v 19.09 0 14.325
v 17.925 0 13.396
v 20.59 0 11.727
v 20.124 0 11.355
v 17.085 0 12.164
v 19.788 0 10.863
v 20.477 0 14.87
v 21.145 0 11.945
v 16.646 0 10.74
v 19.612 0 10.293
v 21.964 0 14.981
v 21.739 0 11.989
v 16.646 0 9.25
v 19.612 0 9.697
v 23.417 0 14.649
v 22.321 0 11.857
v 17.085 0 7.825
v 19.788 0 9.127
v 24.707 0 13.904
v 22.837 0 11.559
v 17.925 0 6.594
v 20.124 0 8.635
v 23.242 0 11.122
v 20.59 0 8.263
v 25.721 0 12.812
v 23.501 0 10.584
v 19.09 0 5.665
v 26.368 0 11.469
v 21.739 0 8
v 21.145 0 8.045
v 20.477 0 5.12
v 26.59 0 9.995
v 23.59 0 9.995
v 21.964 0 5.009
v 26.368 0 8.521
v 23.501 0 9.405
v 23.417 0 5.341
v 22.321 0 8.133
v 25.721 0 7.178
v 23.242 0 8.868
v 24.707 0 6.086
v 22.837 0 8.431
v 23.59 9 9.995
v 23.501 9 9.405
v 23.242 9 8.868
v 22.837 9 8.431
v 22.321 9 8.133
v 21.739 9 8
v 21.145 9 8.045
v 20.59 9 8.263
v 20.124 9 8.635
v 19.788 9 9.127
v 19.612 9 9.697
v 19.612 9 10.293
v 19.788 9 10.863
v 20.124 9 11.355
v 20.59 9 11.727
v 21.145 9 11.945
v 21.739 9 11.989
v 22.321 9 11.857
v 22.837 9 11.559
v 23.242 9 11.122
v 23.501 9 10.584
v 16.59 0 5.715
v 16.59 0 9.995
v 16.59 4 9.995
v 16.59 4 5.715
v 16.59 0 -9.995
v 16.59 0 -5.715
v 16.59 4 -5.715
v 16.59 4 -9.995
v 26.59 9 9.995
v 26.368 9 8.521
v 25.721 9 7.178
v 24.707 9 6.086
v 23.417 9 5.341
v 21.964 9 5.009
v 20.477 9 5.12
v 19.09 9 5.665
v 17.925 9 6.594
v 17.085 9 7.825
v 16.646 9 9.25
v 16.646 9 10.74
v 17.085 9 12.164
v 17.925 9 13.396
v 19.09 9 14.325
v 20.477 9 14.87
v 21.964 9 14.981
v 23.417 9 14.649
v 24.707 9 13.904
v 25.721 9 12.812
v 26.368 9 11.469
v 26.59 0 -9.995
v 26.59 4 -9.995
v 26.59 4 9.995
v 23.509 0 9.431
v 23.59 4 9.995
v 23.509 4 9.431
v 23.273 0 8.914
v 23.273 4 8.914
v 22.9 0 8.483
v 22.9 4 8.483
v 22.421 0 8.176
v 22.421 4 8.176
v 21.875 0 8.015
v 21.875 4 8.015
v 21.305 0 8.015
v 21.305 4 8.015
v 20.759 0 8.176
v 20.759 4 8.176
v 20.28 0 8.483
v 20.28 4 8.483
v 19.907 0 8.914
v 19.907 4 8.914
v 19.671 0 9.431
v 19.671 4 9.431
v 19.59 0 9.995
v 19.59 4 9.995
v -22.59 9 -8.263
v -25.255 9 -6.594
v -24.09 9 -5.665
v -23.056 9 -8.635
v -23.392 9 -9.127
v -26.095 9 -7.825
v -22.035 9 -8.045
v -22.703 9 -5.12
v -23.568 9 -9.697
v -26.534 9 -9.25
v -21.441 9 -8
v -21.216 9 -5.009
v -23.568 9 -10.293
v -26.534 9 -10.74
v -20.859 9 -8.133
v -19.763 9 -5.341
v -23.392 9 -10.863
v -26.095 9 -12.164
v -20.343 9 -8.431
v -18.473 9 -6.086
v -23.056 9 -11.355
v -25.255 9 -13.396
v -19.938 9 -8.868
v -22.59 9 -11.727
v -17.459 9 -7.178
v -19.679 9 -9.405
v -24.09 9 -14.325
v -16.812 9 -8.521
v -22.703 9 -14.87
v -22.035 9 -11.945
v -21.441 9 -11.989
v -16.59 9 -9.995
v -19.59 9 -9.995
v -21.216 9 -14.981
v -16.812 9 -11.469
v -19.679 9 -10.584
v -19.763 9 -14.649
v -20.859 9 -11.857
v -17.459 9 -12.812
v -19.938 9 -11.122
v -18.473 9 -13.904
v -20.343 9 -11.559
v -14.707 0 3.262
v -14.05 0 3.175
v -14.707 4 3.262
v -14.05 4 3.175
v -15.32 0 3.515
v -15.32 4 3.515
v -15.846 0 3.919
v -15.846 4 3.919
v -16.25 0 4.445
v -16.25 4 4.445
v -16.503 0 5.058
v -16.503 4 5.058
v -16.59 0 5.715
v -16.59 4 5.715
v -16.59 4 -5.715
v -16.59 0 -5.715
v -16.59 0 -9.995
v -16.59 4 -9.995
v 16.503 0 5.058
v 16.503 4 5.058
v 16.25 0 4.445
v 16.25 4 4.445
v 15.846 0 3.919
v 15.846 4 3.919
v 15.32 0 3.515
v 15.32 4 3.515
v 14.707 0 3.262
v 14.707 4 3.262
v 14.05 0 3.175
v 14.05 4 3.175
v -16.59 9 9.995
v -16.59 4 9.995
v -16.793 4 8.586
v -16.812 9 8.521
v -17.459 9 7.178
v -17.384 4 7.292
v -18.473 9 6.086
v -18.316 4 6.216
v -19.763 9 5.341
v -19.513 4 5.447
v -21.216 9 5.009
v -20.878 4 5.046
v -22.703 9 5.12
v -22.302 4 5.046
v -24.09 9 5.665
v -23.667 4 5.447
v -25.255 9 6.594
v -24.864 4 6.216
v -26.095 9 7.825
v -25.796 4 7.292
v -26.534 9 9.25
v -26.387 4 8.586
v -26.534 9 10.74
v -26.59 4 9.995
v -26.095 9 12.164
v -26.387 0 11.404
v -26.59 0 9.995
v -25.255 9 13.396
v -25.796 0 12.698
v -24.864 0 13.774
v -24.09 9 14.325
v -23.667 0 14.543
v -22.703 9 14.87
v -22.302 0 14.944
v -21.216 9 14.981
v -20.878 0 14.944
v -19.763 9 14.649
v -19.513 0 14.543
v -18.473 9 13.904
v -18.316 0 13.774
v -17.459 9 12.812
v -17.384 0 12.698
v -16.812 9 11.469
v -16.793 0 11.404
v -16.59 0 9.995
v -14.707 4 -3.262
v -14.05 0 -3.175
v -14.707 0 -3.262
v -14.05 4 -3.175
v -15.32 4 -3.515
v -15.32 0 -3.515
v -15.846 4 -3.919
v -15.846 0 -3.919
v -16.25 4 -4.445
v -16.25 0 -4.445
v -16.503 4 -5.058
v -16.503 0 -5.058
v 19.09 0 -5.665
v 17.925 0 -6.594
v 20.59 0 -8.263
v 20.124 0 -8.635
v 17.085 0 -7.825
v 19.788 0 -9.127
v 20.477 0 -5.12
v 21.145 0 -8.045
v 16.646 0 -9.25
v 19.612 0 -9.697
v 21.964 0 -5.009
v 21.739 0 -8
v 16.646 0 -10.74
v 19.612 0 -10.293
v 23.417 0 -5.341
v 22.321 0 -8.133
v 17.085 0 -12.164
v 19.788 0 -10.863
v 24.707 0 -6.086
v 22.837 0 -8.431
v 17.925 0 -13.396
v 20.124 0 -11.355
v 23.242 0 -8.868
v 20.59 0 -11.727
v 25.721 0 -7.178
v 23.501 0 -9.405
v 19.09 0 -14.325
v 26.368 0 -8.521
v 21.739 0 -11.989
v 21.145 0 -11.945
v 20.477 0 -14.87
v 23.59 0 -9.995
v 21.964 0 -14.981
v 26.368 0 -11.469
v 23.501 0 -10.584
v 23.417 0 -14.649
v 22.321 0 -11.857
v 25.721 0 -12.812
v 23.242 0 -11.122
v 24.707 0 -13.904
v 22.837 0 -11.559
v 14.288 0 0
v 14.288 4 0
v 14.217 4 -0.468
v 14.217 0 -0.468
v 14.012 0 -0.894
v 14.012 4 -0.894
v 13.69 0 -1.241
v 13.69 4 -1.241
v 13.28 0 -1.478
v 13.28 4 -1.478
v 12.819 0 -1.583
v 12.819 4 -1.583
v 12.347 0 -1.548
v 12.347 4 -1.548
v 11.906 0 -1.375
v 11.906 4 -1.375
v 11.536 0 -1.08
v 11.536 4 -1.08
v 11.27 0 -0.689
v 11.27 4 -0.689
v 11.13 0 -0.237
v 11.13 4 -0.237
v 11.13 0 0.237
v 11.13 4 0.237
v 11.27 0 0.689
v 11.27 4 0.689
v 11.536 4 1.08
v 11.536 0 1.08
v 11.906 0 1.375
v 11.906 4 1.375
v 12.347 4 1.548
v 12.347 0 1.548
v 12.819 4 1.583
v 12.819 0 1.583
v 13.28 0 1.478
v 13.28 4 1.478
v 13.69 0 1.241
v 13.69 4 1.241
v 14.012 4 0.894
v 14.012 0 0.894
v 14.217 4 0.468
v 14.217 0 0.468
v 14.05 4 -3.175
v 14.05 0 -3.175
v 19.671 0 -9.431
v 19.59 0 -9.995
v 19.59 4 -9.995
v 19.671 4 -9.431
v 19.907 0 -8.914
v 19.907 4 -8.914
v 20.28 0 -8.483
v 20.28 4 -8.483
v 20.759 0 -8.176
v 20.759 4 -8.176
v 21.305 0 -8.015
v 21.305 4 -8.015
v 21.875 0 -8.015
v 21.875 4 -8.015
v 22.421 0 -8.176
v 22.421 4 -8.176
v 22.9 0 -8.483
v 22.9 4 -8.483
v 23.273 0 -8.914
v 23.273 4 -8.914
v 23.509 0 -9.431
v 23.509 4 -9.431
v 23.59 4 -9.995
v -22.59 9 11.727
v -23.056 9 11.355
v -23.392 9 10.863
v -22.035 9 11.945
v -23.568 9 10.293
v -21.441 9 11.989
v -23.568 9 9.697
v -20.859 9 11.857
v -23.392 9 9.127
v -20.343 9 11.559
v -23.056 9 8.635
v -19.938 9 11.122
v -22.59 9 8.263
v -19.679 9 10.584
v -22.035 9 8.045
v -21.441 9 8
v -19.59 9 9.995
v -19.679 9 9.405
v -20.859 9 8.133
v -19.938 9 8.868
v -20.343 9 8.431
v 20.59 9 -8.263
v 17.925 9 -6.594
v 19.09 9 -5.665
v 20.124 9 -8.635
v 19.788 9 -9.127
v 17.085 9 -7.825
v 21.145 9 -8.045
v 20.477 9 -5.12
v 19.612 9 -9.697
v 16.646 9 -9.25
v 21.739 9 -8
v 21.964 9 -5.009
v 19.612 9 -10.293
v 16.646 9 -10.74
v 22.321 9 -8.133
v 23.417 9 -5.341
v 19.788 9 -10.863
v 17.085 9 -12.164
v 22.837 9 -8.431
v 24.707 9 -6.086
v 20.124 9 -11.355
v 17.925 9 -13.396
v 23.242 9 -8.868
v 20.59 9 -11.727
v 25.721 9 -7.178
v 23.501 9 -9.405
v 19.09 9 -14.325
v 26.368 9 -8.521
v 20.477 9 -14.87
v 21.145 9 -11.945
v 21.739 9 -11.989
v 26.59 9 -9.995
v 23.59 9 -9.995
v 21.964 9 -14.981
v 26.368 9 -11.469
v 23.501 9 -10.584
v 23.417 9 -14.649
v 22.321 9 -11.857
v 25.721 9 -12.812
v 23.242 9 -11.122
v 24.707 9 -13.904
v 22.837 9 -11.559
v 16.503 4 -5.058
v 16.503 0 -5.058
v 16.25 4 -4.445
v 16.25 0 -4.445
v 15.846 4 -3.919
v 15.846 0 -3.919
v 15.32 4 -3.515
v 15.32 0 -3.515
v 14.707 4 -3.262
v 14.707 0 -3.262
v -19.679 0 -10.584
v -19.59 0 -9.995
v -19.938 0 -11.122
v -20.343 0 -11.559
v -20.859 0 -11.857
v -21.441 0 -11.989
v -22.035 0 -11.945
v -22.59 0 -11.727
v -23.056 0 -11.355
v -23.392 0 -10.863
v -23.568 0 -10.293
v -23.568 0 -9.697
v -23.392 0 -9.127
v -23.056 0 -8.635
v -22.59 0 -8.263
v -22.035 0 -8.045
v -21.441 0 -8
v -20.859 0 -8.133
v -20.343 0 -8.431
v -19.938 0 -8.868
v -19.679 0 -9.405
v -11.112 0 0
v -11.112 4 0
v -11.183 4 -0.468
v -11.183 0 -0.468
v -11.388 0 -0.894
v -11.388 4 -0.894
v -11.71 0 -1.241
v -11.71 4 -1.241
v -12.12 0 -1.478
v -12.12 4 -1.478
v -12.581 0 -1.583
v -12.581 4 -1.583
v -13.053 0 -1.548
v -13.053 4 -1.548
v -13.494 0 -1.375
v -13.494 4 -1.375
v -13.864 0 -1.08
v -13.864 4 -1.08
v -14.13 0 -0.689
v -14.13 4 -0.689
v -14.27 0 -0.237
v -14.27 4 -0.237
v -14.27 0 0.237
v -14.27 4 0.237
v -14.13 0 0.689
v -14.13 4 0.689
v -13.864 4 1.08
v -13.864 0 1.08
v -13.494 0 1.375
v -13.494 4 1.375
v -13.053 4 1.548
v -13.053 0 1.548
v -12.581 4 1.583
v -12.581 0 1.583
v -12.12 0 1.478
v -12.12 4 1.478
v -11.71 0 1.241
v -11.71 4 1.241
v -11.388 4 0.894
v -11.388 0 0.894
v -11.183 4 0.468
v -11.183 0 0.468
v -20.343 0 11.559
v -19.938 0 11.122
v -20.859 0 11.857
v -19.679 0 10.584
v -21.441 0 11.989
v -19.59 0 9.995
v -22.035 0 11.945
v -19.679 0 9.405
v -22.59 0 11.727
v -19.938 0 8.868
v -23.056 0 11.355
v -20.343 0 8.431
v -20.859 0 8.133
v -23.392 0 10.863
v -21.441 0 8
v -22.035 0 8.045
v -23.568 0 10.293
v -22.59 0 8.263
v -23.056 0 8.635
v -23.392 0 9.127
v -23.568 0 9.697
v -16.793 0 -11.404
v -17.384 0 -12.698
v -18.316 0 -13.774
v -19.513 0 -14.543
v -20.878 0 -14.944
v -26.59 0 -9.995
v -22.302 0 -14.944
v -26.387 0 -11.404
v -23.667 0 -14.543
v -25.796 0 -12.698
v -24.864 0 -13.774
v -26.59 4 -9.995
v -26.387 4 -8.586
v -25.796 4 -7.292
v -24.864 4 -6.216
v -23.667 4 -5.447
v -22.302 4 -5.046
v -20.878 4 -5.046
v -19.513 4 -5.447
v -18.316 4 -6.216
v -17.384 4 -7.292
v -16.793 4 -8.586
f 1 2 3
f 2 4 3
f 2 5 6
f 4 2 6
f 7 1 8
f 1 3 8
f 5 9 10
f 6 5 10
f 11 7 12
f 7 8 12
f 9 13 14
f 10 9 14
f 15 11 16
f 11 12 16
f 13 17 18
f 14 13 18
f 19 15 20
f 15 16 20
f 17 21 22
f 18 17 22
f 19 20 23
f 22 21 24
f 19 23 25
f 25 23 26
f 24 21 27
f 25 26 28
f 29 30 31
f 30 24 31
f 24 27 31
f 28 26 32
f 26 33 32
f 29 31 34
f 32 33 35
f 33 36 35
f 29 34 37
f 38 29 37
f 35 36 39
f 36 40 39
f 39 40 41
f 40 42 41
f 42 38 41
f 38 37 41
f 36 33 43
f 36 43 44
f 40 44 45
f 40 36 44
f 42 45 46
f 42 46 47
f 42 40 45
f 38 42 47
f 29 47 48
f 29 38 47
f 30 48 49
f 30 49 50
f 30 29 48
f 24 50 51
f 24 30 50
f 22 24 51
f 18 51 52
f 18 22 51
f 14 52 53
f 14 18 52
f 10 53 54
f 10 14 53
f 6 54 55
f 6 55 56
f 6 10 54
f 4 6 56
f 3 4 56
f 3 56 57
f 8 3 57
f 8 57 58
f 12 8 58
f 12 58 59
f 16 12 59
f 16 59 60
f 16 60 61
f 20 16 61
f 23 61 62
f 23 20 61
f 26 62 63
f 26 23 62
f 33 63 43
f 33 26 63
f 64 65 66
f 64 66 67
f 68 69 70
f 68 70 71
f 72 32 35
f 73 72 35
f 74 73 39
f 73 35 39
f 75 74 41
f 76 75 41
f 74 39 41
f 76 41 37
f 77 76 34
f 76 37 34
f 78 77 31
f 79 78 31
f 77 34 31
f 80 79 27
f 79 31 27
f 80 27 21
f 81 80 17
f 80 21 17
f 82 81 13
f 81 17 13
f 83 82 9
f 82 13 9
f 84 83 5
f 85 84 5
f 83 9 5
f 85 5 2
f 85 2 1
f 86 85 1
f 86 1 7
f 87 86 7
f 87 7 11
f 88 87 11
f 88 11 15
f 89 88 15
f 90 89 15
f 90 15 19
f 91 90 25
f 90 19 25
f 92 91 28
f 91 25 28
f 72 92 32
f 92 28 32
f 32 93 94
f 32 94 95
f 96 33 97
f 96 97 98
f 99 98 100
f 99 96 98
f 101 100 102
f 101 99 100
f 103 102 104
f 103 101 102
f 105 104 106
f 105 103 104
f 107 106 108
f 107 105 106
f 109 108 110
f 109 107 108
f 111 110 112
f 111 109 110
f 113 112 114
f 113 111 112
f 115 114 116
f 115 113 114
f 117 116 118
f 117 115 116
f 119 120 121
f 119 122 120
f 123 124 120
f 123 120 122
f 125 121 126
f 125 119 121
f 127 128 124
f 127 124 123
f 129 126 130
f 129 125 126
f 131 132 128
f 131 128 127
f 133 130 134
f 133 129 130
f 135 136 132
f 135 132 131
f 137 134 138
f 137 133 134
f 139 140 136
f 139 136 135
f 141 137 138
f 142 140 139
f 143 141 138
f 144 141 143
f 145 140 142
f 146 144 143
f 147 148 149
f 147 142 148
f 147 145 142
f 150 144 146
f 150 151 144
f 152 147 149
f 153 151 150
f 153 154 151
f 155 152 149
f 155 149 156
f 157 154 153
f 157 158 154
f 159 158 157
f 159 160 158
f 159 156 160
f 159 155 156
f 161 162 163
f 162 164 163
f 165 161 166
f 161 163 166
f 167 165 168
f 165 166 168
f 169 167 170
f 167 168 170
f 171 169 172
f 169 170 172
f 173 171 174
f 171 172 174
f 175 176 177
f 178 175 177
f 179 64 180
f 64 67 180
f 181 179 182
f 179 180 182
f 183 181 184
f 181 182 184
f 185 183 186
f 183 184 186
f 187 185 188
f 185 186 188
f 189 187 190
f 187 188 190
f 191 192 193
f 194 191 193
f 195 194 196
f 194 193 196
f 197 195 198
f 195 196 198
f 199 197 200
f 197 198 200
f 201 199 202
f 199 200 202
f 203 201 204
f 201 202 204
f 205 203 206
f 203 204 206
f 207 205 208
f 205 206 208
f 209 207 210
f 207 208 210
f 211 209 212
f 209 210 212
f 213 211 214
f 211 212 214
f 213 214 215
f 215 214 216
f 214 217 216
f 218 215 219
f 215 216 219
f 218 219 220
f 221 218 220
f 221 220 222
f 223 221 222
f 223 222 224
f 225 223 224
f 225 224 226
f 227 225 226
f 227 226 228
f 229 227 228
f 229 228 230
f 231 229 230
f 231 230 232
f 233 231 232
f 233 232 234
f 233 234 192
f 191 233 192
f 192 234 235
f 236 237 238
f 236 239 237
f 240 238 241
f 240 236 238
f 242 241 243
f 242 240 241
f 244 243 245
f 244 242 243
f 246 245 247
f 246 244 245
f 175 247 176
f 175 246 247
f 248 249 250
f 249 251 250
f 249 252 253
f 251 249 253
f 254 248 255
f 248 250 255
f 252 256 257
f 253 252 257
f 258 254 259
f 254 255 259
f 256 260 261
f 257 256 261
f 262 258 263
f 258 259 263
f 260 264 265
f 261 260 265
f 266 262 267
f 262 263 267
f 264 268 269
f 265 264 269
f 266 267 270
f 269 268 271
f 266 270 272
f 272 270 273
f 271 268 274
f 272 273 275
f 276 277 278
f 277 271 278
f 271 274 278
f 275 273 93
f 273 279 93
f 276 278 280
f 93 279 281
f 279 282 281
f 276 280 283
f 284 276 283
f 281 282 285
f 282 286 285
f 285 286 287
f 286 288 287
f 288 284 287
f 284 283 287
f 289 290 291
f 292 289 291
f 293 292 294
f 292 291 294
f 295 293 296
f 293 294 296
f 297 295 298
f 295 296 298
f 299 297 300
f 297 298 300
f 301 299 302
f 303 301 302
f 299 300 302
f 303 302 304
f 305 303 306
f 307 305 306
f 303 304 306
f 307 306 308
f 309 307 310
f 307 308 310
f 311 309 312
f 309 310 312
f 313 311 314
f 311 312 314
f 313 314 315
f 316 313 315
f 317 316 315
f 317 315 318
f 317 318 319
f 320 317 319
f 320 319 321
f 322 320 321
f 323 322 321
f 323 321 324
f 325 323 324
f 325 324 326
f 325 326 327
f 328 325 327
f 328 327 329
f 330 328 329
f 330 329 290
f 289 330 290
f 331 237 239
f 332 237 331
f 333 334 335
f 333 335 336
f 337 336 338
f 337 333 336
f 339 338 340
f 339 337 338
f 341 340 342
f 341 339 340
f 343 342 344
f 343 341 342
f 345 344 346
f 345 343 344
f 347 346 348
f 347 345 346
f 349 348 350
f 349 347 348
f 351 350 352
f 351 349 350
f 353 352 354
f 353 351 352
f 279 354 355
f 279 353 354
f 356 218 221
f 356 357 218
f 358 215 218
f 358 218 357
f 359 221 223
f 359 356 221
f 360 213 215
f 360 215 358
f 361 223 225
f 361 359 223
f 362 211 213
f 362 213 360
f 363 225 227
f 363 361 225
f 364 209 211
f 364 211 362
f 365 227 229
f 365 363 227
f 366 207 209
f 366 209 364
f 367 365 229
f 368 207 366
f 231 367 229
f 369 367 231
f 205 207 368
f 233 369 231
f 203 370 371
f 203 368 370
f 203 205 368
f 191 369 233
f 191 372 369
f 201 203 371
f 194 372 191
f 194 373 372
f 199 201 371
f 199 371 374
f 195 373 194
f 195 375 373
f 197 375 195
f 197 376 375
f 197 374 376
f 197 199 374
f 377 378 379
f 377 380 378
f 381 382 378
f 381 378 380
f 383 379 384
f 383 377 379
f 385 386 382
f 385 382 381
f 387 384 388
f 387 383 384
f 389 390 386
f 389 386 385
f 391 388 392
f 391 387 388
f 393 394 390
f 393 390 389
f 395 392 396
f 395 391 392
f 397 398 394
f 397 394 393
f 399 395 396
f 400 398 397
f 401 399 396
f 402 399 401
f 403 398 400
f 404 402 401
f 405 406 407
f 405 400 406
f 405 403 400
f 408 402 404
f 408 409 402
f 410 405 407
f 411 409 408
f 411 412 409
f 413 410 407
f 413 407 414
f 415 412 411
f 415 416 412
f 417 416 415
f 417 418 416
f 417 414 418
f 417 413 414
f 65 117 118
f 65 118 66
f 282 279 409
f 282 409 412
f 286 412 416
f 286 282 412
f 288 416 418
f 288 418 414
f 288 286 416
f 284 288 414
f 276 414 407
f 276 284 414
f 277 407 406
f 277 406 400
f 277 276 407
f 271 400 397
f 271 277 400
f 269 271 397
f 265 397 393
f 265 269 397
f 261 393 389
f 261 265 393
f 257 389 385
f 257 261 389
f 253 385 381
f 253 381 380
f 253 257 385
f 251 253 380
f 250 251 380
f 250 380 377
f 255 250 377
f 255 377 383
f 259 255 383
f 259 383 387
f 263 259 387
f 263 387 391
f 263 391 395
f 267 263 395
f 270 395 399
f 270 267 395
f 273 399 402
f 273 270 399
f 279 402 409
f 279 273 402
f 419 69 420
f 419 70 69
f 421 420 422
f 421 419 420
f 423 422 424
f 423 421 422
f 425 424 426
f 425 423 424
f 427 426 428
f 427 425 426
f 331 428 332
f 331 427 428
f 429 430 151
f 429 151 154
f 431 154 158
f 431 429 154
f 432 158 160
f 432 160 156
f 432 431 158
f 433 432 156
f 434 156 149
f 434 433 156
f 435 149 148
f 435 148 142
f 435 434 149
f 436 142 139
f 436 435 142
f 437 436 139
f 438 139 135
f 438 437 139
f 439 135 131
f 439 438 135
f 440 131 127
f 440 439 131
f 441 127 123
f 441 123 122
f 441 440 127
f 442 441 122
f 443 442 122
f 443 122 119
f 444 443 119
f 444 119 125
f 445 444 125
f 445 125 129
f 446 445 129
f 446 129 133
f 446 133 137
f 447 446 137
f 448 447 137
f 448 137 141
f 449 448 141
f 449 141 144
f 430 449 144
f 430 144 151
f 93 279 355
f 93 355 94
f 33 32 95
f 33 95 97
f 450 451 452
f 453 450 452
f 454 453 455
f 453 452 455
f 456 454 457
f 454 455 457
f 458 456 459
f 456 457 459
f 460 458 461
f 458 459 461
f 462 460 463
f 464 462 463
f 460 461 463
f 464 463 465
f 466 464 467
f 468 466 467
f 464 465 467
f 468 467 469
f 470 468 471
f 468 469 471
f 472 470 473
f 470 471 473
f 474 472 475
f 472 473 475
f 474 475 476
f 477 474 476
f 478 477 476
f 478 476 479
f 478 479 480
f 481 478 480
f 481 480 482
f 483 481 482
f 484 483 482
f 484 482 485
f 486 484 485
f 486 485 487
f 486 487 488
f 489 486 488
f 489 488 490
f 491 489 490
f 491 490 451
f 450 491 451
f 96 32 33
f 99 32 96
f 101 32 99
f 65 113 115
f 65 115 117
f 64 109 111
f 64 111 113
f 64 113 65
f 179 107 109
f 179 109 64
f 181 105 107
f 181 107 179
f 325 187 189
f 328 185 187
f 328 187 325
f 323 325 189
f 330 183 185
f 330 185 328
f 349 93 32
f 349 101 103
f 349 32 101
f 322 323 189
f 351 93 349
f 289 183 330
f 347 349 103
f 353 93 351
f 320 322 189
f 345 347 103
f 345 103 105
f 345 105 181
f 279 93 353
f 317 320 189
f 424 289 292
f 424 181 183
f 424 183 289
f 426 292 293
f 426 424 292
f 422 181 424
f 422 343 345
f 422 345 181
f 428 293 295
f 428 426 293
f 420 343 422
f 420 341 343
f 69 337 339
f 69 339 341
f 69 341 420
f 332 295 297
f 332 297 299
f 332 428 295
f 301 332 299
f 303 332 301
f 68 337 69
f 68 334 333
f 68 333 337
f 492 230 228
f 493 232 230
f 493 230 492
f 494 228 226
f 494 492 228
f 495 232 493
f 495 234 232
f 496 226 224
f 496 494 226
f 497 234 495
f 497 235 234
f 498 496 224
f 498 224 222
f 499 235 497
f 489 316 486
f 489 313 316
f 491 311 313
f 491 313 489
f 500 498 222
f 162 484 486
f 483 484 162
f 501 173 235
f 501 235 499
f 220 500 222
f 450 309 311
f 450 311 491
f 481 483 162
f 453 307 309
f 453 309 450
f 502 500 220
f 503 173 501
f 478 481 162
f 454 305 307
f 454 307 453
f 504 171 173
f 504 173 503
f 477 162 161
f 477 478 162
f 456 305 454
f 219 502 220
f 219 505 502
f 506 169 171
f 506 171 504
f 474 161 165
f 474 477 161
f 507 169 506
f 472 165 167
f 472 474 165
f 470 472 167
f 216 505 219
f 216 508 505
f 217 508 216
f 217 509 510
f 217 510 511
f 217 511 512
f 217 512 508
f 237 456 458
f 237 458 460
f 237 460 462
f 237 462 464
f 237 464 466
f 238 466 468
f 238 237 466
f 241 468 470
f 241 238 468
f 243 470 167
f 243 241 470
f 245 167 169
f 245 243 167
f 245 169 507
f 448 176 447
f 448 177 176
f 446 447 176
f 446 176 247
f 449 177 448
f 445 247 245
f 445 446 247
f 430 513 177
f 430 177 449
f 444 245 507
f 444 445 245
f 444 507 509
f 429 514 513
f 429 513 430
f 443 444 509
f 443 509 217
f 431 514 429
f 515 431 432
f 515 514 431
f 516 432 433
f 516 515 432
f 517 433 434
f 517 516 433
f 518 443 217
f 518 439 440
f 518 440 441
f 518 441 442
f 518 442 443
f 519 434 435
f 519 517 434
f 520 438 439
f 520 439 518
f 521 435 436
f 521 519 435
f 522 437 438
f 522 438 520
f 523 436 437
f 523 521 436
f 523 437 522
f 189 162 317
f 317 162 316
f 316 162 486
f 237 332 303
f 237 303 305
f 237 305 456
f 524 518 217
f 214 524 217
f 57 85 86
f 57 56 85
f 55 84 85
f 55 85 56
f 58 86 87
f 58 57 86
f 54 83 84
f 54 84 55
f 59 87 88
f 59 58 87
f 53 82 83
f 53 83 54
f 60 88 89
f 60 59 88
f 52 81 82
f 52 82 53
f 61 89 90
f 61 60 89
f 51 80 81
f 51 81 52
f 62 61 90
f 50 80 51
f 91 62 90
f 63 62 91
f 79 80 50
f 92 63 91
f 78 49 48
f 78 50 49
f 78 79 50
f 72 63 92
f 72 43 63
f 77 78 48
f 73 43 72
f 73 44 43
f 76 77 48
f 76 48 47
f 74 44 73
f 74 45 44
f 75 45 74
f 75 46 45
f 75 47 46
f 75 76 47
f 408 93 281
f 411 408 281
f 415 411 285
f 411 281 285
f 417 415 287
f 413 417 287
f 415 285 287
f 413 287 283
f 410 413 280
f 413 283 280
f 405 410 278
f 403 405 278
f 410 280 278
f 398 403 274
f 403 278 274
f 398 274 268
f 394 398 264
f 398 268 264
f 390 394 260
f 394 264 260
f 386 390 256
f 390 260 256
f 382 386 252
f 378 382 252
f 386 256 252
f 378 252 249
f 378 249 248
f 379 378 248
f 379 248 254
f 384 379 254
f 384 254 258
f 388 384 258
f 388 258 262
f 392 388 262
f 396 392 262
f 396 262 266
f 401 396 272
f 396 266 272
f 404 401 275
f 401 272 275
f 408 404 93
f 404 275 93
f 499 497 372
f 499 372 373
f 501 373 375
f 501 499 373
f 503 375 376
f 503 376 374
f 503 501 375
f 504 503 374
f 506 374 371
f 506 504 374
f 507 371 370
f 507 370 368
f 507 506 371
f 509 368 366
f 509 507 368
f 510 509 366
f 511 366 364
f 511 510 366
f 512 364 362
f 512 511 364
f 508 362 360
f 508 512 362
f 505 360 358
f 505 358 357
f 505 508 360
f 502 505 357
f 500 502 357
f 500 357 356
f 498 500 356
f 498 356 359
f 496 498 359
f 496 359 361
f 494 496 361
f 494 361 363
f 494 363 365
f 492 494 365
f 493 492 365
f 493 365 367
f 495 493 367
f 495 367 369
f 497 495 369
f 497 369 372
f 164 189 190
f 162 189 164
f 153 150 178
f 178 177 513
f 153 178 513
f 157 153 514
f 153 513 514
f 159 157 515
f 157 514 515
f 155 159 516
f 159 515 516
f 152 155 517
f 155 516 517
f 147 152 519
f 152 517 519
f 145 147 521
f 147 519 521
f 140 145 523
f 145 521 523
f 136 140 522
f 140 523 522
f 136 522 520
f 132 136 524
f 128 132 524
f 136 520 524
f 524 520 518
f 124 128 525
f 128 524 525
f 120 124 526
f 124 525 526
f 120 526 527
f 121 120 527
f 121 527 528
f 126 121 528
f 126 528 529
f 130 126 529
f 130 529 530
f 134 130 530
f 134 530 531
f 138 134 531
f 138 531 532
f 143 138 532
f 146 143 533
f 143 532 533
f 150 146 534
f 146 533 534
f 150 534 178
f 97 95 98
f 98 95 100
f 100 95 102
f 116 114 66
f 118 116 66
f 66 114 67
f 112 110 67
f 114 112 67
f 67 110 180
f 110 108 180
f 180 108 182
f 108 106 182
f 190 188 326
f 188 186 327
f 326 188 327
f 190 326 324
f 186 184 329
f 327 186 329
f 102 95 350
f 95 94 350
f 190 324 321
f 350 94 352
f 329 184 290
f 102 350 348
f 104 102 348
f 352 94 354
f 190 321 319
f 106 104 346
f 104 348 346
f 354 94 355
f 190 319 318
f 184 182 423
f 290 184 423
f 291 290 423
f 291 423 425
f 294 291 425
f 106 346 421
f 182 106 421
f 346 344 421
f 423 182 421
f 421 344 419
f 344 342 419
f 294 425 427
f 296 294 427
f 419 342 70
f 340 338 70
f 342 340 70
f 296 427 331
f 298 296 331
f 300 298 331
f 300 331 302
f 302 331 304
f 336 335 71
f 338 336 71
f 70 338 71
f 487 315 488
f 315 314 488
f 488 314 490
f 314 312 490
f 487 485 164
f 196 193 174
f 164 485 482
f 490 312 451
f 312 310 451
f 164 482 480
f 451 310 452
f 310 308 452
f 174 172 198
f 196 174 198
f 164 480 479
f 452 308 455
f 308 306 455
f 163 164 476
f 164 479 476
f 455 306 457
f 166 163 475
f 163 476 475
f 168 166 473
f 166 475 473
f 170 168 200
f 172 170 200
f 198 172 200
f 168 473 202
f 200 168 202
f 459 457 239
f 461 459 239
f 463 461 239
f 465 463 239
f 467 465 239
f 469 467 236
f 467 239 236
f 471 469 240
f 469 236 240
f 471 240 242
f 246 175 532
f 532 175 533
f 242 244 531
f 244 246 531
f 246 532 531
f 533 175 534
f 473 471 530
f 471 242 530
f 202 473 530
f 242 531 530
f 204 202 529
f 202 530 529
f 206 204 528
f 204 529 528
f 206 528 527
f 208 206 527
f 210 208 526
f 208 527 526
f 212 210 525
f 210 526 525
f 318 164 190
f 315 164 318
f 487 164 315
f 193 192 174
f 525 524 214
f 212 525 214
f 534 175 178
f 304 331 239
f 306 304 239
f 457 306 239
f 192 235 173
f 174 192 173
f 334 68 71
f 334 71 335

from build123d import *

# Parameters (mm, degrees)
SKETCH4_R             = 5
SKETCH4_R_2           = 2
BOSS_EXTRUDE3_DEPTH   = 9
BOSS_EXTRUDE3_2_DEPTH = 9
BOSS_EXTRUDE3_3_DEPTH = 9
BOSS_EXTRUDE3_4_DEPTH = 9
BOSS_EXTRUDE4_DEPTH   = 4
SKETCH6_R             = 1.5875
CUT_EXTRUDE1_DEPTH    = 5
FILLET1_R             = 2.54


with BuildPart() as part:
    # Sketch4 → Boss-Extrude3 (new body)
    with BuildSketch(Plane(origin=(0, 0, 0), x_dir=(1, 0, 0), z_dir=(0, 1, 0))):
        with Locations((-21.59, 9.9949)):
            Circle(SKETCH4_R)
        with Locations((-21.59, 9.9949)):
            Circle(SKETCH4_R_2, mode=Mode.SUBTRACT)
    extrude(amount=BOSS_EXTRUDE3_DEPTH)



with BuildPart() as body_2:
    # Sketch4 → Boss-Extrude3 2 (new body)
    with BuildSketch(Plane(origin=(0, 0, 0), x_dir=(1, 0, 0), z_dir=(0, 1, 0))):
        with Locations((-21.59, -9.9949)):
            Circle(SKETCH4_R)
        with Locations((-21.59, -9.9949)):
            Circle(SKETCH4_R_2, mode=Mode.SUBTRACT)
    extrude(amount=BOSS_EXTRUDE3_2_DEPTH)


with BuildPart() as body_3:
    # Sketch4 → Boss-Extrude3 3 (new body)
    with BuildSketch(Plane(origin=(0, 0, 0), x_dir=(1, 0, 0), z_dir=(0, 1, 0))):
        with Locations((21.59, 9.9949)):
            Circle(SKETCH4_R)
        with Locations((21.59, 9.9949)):
            Circle(SKETCH4_R_2, mode=Mode.SUBTRACT)
    extrude(amount=BOSS_EXTRUDE3_3_DEPTH)


with BuildPart() as body_4:
    # Sketch4 → Boss-Extrude3 4 (new body)
    with BuildSketch(Plane(origin=(0, 0, 0), x_dir=(1, 0, 0), z_dir=(0, 1, 0))):
        with Locations((21.59, -9.9949)):
            Circle(SKETCH4_R)
        with Locations((21.59, -9.9949)):
            Circle(SKETCH4_R_2, mode=Mode.SUBTRACT)
    extrude(amount=BOSS_EXTRUDE3_4_DEPTH)


with BuildPart() as part_1:
    add(part.part)

    add(body_2.part)  # Boss-Extrude4 merges body 2
    # Sketch5 → Boss-Extrude4 (add)
    with BuildSketch(Plane(origin=(0, 0, 0), x_dir=(1, 0, 0), z_dir=(0, 1, 0))):
        with BuildLine():
            ThreePointArc((-23.59, -9.9949), (-21.59, -7.9949), (-19.59, -9.9949))
            Line((-19.59, -9.9949), (-16.59, -9.9949))
            Line((-16.59, -9.9949), (-16.59, -3.175))
            Line((-16.59, -3.175), (0, -3.175))
            Line((0, -3.175), (0, 3.175))
            Line((0, 3.175), (-16.59, 3.175))
            Line((-16.59, 3.175), (-16.59, 9.9949))
            Line((-16.59, 9.9949), (-19.59, 9.9949))
            ThreePointArc((-19.59, 9.9949), (-21.59, 7.9949), (-23.59, 9.9949))
            Line((-23.59, 9.9949), (-26.59, 9.9949))
            Line((-26.59, 9.9949), (-26.59, -9.9949))
            Line((-26.59, -9.9949), (-23.59, -9.9949))
        make_face()
    boss_extrude4 = extrude(amount=BOSS_EXTRUDE4_DEPTH)

    # Mirror1: Boss-Extrude4 across plane
    add(boss_extrude4.mirror(Plane(origin=(0, 0, 0), x_dir=(0, 0, 1), z_dir=(1, 0, 0))))

    # Sketch6 → Cut-Extrude1 (cut, through all)
    with BuildSketch(Plane(origin=(0, 4, 0), x_dir=(1, 0, 0), z_dir=(0, 1, 0))):
        with Locations((-12.7, 0)):
            Circle(SKETCH6_R)
        with Locations((12.7, 0)):
            Circle(SKETCH6_R)
    extrude(amount=-CUT_EXTRUDE1_DEPTH, mode=Mode.SUBTRACT)

    # Fillet1
    fillet1_edges = [part_1.edges().sort_by_distance(p)[0] for p in [
        (-16.59, 2, 3.175),
        (-16.59, 2, -3.175),
        (16.59, 2, -3.175),
        (16.59, 2, 3.175),
    ]]
    fillet(fillet1_edges, radius=FILLET1_R)


solid = Compound([body_3.part, body_4.part, part_1.part])
